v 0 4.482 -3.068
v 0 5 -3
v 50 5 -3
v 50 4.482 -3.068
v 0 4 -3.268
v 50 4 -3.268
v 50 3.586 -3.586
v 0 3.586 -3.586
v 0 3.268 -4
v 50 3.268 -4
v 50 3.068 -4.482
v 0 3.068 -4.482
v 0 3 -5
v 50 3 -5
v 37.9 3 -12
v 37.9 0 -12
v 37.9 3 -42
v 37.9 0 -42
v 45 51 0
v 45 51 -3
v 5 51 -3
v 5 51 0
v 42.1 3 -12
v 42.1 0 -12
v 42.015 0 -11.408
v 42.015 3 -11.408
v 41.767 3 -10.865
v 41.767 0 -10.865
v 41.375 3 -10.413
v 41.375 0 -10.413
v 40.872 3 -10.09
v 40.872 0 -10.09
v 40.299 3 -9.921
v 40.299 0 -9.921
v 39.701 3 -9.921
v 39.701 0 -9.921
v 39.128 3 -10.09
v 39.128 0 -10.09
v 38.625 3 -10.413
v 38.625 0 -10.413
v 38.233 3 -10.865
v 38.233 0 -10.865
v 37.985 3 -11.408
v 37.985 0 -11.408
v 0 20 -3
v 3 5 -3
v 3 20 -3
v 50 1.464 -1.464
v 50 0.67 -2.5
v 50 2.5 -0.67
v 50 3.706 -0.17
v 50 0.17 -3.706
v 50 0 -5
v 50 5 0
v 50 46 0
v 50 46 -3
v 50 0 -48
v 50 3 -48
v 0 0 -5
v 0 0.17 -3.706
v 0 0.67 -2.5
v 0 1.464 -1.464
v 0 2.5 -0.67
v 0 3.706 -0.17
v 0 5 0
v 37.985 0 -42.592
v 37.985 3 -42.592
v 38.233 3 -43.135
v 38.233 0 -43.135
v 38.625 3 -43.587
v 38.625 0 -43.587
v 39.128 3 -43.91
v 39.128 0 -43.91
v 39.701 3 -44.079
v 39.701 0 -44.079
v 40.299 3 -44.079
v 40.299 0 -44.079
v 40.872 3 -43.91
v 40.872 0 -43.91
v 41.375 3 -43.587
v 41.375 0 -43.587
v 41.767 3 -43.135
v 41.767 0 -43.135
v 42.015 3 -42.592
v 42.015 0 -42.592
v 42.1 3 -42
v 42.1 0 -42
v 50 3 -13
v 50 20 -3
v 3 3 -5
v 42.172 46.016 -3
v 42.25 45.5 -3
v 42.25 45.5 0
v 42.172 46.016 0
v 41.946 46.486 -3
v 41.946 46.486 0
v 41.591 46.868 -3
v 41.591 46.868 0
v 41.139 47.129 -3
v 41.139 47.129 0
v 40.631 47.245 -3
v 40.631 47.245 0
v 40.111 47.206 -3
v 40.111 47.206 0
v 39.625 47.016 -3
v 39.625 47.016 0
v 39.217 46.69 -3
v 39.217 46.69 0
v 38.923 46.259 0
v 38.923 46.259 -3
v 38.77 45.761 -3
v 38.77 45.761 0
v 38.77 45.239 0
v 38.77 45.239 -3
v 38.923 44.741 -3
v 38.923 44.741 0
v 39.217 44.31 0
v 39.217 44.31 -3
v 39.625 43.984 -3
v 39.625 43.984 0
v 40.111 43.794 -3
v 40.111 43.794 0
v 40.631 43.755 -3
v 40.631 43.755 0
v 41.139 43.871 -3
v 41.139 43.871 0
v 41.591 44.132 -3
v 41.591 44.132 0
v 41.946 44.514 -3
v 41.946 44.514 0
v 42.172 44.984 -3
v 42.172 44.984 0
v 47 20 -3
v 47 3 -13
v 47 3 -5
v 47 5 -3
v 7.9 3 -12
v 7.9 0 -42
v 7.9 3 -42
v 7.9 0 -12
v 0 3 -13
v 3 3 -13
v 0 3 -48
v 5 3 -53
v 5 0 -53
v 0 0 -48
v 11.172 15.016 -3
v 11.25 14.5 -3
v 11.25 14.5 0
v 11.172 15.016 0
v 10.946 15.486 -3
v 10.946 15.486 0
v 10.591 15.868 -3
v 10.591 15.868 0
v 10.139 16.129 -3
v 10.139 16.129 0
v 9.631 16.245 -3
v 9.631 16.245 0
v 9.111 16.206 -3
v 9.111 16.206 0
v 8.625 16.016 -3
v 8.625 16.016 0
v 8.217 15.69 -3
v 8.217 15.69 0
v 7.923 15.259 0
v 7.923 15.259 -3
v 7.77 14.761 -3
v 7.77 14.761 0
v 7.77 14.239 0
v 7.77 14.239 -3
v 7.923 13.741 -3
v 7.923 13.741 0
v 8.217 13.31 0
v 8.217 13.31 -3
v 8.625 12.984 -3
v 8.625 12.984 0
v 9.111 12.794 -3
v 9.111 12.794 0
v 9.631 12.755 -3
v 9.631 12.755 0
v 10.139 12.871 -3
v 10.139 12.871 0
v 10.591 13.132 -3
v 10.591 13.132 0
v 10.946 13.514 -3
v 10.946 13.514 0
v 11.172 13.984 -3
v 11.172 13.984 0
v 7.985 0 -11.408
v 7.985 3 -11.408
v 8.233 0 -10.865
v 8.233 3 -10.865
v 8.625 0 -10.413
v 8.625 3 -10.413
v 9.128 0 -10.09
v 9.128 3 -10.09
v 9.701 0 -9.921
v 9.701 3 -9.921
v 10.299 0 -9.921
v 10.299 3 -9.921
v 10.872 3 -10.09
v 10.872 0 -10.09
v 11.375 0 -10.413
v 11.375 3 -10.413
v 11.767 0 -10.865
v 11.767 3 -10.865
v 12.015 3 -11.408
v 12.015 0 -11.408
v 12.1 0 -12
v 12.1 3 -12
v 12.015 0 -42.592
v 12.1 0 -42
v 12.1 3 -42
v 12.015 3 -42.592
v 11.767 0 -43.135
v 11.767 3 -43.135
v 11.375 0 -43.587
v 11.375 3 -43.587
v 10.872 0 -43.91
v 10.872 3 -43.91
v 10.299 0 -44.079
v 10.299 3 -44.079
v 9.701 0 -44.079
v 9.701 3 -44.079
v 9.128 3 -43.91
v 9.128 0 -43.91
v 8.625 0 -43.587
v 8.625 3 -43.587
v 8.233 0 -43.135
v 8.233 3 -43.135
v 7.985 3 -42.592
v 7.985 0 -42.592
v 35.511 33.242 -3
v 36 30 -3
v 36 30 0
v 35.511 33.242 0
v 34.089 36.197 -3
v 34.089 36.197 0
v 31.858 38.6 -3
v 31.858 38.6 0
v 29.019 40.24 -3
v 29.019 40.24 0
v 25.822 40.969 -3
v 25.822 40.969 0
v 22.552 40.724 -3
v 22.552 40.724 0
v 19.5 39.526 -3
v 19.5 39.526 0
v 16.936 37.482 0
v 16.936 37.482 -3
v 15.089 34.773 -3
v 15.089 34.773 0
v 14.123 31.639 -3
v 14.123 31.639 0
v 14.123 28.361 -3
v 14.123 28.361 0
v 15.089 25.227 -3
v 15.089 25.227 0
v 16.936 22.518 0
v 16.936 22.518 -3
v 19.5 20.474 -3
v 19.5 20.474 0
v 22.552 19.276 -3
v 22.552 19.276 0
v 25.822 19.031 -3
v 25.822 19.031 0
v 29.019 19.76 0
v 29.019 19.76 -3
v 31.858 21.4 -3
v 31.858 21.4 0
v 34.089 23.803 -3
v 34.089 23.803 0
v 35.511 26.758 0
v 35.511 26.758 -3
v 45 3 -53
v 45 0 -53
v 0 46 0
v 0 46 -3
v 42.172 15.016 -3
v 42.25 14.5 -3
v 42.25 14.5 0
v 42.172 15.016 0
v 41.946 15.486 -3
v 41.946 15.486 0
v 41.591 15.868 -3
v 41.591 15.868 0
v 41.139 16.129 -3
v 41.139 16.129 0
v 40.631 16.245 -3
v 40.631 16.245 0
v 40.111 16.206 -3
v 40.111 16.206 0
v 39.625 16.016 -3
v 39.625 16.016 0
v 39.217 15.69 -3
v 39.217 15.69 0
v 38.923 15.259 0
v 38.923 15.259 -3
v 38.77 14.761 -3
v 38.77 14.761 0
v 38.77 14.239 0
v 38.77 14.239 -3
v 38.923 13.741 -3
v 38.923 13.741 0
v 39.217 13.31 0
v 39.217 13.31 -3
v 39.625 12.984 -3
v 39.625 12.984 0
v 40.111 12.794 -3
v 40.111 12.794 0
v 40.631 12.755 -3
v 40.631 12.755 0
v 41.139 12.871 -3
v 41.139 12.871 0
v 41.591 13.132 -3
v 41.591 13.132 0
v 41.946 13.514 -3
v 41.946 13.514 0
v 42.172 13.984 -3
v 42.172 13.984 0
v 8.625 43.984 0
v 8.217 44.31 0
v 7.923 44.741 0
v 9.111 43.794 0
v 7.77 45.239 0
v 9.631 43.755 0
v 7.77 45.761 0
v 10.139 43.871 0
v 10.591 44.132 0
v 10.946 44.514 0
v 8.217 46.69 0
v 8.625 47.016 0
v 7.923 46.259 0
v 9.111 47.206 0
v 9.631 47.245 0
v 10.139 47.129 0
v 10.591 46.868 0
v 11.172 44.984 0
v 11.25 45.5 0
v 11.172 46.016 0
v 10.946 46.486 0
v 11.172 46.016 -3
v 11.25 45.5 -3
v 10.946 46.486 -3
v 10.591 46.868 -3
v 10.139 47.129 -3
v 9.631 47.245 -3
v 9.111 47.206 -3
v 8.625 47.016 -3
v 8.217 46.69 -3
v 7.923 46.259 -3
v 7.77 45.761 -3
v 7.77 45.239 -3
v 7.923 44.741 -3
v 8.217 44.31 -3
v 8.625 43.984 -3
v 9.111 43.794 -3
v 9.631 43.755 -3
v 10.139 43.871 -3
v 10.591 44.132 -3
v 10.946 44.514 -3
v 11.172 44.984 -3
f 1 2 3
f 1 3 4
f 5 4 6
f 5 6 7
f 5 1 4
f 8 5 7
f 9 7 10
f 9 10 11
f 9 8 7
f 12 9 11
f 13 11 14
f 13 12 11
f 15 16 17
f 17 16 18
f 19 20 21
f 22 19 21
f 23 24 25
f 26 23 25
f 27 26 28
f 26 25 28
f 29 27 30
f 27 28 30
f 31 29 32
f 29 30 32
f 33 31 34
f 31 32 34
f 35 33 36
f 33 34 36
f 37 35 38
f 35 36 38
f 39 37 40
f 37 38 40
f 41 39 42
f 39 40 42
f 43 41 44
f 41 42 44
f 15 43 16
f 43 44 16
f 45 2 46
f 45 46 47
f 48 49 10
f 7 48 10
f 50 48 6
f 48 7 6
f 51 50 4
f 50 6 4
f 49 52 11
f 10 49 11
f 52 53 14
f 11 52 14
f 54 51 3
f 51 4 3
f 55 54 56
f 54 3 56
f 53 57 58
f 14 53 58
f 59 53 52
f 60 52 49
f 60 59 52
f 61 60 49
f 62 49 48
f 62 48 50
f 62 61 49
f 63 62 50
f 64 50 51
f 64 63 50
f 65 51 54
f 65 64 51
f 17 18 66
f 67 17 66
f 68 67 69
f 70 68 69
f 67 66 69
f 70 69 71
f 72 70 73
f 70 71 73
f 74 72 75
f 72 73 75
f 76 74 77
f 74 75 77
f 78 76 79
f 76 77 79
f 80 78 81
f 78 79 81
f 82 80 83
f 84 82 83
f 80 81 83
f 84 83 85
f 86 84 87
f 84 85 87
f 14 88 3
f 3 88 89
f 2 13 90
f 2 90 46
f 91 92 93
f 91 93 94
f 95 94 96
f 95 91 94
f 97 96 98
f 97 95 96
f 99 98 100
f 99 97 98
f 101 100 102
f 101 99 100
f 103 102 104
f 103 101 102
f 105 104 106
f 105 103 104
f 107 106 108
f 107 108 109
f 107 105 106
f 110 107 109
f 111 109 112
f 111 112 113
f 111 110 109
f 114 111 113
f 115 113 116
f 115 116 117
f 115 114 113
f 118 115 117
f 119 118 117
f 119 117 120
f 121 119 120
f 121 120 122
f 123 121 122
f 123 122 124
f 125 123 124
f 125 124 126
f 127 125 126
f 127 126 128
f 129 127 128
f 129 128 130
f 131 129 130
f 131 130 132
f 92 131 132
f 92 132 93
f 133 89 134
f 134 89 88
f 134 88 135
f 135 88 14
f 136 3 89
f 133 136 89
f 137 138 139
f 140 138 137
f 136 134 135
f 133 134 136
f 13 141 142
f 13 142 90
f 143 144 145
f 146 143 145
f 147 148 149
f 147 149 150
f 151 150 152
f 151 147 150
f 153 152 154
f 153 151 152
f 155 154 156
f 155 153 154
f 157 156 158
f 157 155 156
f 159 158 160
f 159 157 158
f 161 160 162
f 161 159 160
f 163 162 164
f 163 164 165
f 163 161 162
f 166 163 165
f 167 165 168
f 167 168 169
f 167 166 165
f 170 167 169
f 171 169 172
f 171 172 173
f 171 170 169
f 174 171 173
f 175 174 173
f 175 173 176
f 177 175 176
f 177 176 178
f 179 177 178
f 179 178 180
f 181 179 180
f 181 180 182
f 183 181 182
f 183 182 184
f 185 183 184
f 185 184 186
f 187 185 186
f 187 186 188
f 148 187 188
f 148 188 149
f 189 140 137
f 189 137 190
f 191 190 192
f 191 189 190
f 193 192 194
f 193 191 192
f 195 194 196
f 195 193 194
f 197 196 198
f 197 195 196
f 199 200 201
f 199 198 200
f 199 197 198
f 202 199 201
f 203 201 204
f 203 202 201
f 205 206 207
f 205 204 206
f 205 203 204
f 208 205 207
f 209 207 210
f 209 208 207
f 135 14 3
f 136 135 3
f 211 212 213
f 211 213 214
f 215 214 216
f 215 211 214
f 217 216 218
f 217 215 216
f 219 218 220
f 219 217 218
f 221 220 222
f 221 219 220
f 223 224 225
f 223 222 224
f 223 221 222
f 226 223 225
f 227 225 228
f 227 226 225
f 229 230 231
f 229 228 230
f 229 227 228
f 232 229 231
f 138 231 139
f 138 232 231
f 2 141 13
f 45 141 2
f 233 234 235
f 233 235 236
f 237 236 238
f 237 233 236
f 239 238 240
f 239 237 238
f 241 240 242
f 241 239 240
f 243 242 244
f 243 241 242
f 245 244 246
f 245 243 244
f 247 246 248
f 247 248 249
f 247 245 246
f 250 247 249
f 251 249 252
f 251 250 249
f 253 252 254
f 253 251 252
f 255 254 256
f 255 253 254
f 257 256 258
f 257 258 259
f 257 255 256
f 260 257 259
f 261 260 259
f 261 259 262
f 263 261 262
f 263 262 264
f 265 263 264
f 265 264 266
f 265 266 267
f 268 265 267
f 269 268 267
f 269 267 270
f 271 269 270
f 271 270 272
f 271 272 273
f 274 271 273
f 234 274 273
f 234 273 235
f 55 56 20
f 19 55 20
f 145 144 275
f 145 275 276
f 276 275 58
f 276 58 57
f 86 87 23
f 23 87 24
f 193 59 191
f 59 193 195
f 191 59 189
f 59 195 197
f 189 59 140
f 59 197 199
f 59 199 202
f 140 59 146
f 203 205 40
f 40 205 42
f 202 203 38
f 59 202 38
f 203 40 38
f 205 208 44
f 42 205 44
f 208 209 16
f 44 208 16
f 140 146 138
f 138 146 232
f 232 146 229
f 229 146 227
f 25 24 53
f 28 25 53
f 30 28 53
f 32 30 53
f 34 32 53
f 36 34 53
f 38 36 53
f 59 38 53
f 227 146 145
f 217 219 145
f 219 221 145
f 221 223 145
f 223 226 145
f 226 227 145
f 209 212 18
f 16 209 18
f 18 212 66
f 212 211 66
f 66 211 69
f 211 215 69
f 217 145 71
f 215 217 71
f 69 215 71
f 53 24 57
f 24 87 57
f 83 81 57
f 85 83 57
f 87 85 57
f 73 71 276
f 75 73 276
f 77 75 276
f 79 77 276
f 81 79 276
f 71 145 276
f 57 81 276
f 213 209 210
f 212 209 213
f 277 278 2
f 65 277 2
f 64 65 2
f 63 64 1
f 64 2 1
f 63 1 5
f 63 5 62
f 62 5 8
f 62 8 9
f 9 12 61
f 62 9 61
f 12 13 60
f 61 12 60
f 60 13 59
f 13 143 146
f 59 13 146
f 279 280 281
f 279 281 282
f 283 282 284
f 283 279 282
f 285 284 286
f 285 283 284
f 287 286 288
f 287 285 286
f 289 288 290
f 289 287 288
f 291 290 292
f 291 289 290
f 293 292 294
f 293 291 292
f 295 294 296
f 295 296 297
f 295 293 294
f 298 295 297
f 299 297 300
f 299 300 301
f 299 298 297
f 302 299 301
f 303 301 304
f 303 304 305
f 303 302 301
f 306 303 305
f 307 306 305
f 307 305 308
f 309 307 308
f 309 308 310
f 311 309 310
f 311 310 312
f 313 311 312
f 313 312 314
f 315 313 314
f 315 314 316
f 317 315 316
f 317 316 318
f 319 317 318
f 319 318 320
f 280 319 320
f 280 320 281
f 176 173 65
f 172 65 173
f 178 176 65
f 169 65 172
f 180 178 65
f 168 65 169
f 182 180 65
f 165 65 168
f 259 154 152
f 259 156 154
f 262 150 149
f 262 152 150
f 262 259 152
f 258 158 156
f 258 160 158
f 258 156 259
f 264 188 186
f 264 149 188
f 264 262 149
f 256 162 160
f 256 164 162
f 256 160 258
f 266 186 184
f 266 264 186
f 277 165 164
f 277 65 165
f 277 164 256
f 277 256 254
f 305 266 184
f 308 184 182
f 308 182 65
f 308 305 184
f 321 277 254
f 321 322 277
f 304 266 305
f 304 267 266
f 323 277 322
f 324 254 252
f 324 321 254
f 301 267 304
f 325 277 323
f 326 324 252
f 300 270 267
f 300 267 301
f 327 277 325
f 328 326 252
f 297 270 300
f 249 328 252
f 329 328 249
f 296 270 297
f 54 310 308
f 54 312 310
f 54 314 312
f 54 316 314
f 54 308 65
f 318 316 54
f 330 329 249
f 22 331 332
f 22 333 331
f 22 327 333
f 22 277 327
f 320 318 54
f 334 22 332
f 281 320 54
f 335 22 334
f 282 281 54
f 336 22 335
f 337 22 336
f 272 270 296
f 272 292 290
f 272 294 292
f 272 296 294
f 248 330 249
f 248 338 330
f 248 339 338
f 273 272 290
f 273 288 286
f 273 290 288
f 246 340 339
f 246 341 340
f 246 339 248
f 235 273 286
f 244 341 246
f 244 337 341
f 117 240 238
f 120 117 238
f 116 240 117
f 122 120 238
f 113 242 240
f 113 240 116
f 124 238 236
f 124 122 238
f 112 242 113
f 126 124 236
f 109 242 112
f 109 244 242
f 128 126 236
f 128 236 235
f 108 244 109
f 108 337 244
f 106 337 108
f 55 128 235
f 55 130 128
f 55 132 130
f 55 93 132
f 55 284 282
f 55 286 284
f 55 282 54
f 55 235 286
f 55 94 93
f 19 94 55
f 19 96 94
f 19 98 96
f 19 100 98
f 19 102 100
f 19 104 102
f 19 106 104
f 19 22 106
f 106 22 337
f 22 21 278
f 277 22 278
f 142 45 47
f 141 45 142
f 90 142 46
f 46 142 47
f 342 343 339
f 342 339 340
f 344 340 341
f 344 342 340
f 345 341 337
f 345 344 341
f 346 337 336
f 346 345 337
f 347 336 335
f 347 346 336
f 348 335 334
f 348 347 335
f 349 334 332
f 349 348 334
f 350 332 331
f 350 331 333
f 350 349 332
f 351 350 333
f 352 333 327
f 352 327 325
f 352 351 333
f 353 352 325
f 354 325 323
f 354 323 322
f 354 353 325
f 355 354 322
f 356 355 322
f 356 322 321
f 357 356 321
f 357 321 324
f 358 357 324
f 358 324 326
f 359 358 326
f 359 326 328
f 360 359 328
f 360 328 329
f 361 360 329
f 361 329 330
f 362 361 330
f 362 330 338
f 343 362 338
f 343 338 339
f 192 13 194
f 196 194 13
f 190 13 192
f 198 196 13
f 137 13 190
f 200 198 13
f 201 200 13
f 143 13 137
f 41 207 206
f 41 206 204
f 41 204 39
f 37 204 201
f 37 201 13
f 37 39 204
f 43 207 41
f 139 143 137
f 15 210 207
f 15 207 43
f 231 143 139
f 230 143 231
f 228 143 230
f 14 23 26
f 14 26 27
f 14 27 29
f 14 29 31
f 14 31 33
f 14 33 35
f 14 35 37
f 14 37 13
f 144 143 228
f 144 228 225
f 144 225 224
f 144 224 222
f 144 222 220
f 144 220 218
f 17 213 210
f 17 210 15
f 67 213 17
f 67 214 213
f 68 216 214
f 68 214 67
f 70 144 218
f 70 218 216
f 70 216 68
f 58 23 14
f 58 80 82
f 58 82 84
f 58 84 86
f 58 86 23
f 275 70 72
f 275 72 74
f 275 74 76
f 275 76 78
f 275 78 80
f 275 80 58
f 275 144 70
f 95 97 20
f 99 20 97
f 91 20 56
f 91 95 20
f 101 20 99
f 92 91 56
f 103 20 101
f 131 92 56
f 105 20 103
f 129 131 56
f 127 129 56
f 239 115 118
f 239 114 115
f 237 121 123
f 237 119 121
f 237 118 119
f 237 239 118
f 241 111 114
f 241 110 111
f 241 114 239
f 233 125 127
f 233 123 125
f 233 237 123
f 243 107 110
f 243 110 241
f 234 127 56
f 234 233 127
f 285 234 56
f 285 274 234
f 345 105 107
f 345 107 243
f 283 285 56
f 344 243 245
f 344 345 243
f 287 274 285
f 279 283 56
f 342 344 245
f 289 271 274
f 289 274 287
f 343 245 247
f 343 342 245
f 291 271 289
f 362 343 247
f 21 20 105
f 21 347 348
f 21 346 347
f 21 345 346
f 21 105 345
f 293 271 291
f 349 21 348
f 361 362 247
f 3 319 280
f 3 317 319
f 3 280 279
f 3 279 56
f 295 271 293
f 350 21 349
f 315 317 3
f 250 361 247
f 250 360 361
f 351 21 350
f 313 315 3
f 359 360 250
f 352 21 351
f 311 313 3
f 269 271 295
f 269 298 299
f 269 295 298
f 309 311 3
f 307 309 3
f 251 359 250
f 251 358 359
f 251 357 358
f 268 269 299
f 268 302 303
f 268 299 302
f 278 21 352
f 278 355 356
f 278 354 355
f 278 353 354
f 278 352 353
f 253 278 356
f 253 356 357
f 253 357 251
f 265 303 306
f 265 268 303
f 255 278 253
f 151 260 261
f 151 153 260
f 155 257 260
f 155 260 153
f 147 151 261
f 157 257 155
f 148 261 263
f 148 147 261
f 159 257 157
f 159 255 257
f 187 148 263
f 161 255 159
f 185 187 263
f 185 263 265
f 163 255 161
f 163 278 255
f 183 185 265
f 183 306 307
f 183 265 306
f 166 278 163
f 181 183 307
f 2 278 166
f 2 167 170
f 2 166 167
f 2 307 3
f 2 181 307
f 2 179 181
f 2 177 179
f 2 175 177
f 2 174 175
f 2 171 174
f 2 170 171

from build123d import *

# Parameters (mm, degrees)
BOSS_EXTRUDE2_DEPTH          = 50
SKETCH4_R                    = 11
SKETCH4_R_2                  = 1.75
CUT_EXTRUDE1_DEPTH           = 50
CHAMFER1_SIZE                = 5
CUT_EXTRUDE2_DEPTH           = 50
FLATTEN_BENDS1_START         = 3
FLATTEN_BENDS1_OUTLINE_W     = 50
FLATTEN_BENDS1_OUTLINE_H     = 3
FLATTEN_BENDS1_DEPTH         = 48
FLATTEN_BENDS1_2_OUTLINE_R   = 1.75
FLATTEN_BENDS1_2_OUTLINE_R_2 = 11
FLATTEN_BENDS1_2_DEPTH       = 3
PROCESS_BENDS1_START         = -0.067055507
PROCESS_BENDS1_OUTLINE_W     = 50
PROCESS_BENDS1_OUTLINE_H     = 3
PROCESS_BENDS1_DEPTH         = 46.564842651
PROCESS_BENDS1_START_2       = -3
PROCESS_BENDS1_2_OUTLINE_R   = 1.75
PROCESS_BENDS1_2_OUTLINE_R_2 = 11
PROCESS_BENDS1_2_DEPTH       = 2.5137
PROCESS_BENDS1_START_3       = -5
PROCESS_BENDS1_3_OUTLINE_R   = 1.75
PROCESS_BENDS1_3_OUTLINE_R_2 = 11
PROCESS_BENDS1_3_DEPTH       = 5
PROCESS_BENDS1_4_DEPTH       = 50
BOSS_EXTRUDE3_DEPTH          = 3
BOSS_EXTRUDE4_START          = -50
BOSS_EXTRUDE4_DEPTH          = 3


with BuildPart() as part:
    # Sketch3 → Boss-Extrude2 (new body)
    with BuildSketch(Plane(origin=(0, 0, 0), x_dir=(0, 0, -1), z_dir=(1, 0, 0))):
        Polygon((0, 0), (0, 51), (3, 51), (3, 3), (53, 3), (53, 0), align=None)
    extrude(amount=BOSS_EXTRUDE2_DEPTH)

    # Sketch4 → Cut-Extrude1 (cut)
    with BuildSketch(Plane.XY):
        with Locations((25, 30)):
            Circle(SKETCH4_R)
        with Locations((9.5, 45.5)):
            Circle(SKETCH4_R_2)
        with Locations((40.5, 45.5)):
            Circle(SKETCH4_R_2)
        with Locations((40.5, 14.5)):
            Circle(SKETCH4_R_2)
        with Locations((9.5, 14.5)):
            Circle(SKETCH4_R_2)
    extrude(amount=-CUT_EXTRUDE1_DEPTH, mode=Mode.SUBTRACT)

    # Chamfer1
    chamfer1_edges = [part.edges().sort_by_distance(p)[0] for p in [
        (50, 51, -1.5),
        (0, 51, -1.5),
        (0, 1.5, -53),
        (50, 1.5, -53),
    ]]
    chamfer(chamfer1_edges, length=CHAMFER1_SIZE)

    # Sketch7 → Cut-Extrude2 (cut)
    with BuildSketch(Plane.XZ):
        with BuildLine():
            Line((7.9, -42), (7.9, -12))
            ThreePointArc((7.9, -12), (10, -9.9), (12.1, -12))
            Line((12.1, -12), (12.1, -42))
            ThreePointArc((12.1, -42), (10, -44.1), (7.9, -42))
        make_face()
        with BuildLine():
            Line((42.1, -42), (42.1, -12))
            ThreePointArc((42.1, -12), (40, -9.9), (37.9, -12))
            Line((37.9, -12), (37.9, -42))
            ThreePointArc((37.9, -42), (40, -44.1), (42.1, -42))
        make_face()
    extrude(amount=-CUT_EXTRUDE2_DEPTH, mode=Mode.SUBTRACT)

    # Flatten-Bends1: read off the stored shape, not the designer's step
    # Flatten-Bends1 outline → Flatten-Bends1 (cut)
    with BuildSketch(Plane(origin=(0, 0, 0), x_dir=(1, 0, 0), z_dir=(0, 1, 0)).offset(FLATTEN_BENDS1_START)):
        with Locations((25, 1.5)):
            Rectangle(FLATTEN_BENDS1_OUTLINE_W, FLATTEN_BENDS1_OUTLINE_H)
    extrude(amount=FLATTEN_BENDS1_DEPTH, mode=Mode.SUBTRACT)

    # Flatten-Bends1 2 outline → Flatten-Bends1 2 (add)
    with BuildSketch(Plane(origin=(0, 0, 0), x_dir=(1, 0, 0), z_dir=(0, 1, 0))):
        Polygon((0, 0), (0, -41.497787144), (5, -46.497787144), (45, -46.497787144), (50, -41.497787144), (50, 0), align=None)
        with Locations((9.5, -40.997787144)):
            Circle(FLATTEN_BENDS1_2_OUTLINE_R, mode=Mode.SUBTRACT)
        with Locations((40.5, -40.997787144)):
            Circle(FLATTEN_BENDS1_2_OUTLINE_R, mode=Mode.SUBTRACT)
        with Locations((25, -25.497787144)):
            Circle(FLATTEN_BENDS1_2_OUTLINE_R_2, mode=Mode.SUBTRACT)
        with Locations((9.5, -9.997787144)):
            Circle(FLATTEN_BENDS1_2_OUTLINE_R, mode=Mode.SUBTRACT)
        with Locations((40.5, -9.997787144)):
            Circle(FLATTEN_BENDS1_2_OUTLINE_R, mode=Mode.SUBTRACT)
    extrude(amount=FLATTEN_BENDS1_2_DEPTH)

    # Process-Bends1: read off the stored shape, not the designer's step
    # Process-Bends1 outline → Process-Bends1 (cut)
    with BuildSketch(Plane.XY.offset(PROCESS_BENDS1_START)):
        with Locations((25, 1.5)):
            Rectangle(PROCESS_BENDS1_OUTLINE_W, PROCESS_BENDS1_OUTLINE_H)
    extrude(amount=PROCESS_BENDS1_DEPTH, mode=Mode.SUBTRACT)

    # Process-Bends1 2 outline → Process-Bends1 2 (add)
    with BuildSketch(Plane.XY.offset(PROCESS_BENDS1_START_2)):
        Polygon((0, 46), (0, 3), (50, 3), (50, 46), (45, 51), (5, 51), align=None)
        with Locations((9.5, 14.5)):
            Circle(PROCESS_BENDS1_2_OUTLINE_R, mode=Mode.SUBTRACT)
        with Locations((40.5, 14.5)):
            Circle(PROCESS_BENDS1_2_OUTLINE_R, mode=Mode.SUBTRACT)
        with Locations((9.5, 45.5)):
            Circle(PROCESS_BENDS1_2_OUTLINE_R, mode=Mode.SUBTRACT)
        with Locations((25, 30)):
            Circle(PROCESS_BENDS1_2_OUTLINE_R_2, mode=Mode.SUBTRACT)
        with Locations((40.5, 45.5)):
            Circle(PROCESS_BENDS1_2_OUTLINE_R, mode=Mode.SUBTRACT)
    extrude(amount=PROCESS_BENDS1_2_DEPTH)

    # Process-Bends1 3 outline → Process-Bends1 3 (add)
    with BuildSketch(Plane.XY.offset(PROCESS_BENDS1_START_3)):
        Polygon((0, 46), (0, 3), (50, 3), (50, 46), (45, 51), (5, 51), align=None)
        with Locations((9.5, 14.5)):
            Circle(PROCESS_BENDS1_3_OUTLINE_R, mode=Mode.SUBTRACT)
        with Locations((40.5, 14.5)):
            Circle(PROCESS_BENDS1_3_OUTLINE_R, mode=Mode.SUBTRACT)
        with Locations((9.5, 45.5)):
            Circle(PROCESS_BENDS1_3_OUTLINE_R, mode=Mode.SUBTRACT)
        with Locations((25, 30)):
            Circle(PROCESS_BENDS1_3_OUTLINE_R_2, mode=Mode.SUBTRACT)
        with Locations((40.5, 45.5)):
            Circle(PROCESS_BENDS1_3_OUTLINE_R, mode=Mode.SUBTRACT)
    extrude(amount=PROCESS_BENDS1_3_DEPTH)

    # Process-Bends1 4 outline → Process-Bends1 4 (cut)
    with BuildSketch(Plane.YZ):
        with BuildLine():
            Line((51, -5), (51, -3))
            Line((51, -3), (5, -3))
            ThreePointArc((5, -3), (3.585786438, -3.585786438), (3, -5))
            Line((3, -5), (51, -5))
        make_face()
        with BuildLine():
            ThreePointArc((0, -5), (1.464466094, -1.464466094), (5, 0))
            Line((5, 0), (3, 0))
            Line((3, 0), (3, -0.067055507))
            Line((3, -0.067055507), (0, -0.067055507))
            Line((0, -0.067055507), (0, -5))
        make_face()
    extrude(amount=PROCESS_BENDS1_4_DEPTH, mode=Mode.SUBTRACT)


with BuildPart() as body_2:
    # Sketch14 → Boss-Extrude3 (new body)
    with BuildSketch(Plane(origin=(50, 0, 0), x_dir=(0, 0, -1), z_dir=(1, 0, 0))):
        Polygon((3, 20), (13, 3), (5, 3), (3, 5), align=None)
    extrude(amount=-BOSS_EXTRUDE3_DEPTH)


with BuildPart() as body_3:
    # Sketch14<2> → Boss-Extrude4 (new body)
    with BuildSketch(Plane(origin=(50, 0, 0), x_dir=(0, 0, -1), z_dir=(1, 0, 0)).offset(BOSS_EXTRUDE4_START)):
        Polygon((3, 20), (13, 3), (5, 3), (3, 5), align=None)
    extrude(amount=BOSS_EXTRUDE4_DEPTH)


solid = Compound([part.part, body_2.part, body_3.part])
